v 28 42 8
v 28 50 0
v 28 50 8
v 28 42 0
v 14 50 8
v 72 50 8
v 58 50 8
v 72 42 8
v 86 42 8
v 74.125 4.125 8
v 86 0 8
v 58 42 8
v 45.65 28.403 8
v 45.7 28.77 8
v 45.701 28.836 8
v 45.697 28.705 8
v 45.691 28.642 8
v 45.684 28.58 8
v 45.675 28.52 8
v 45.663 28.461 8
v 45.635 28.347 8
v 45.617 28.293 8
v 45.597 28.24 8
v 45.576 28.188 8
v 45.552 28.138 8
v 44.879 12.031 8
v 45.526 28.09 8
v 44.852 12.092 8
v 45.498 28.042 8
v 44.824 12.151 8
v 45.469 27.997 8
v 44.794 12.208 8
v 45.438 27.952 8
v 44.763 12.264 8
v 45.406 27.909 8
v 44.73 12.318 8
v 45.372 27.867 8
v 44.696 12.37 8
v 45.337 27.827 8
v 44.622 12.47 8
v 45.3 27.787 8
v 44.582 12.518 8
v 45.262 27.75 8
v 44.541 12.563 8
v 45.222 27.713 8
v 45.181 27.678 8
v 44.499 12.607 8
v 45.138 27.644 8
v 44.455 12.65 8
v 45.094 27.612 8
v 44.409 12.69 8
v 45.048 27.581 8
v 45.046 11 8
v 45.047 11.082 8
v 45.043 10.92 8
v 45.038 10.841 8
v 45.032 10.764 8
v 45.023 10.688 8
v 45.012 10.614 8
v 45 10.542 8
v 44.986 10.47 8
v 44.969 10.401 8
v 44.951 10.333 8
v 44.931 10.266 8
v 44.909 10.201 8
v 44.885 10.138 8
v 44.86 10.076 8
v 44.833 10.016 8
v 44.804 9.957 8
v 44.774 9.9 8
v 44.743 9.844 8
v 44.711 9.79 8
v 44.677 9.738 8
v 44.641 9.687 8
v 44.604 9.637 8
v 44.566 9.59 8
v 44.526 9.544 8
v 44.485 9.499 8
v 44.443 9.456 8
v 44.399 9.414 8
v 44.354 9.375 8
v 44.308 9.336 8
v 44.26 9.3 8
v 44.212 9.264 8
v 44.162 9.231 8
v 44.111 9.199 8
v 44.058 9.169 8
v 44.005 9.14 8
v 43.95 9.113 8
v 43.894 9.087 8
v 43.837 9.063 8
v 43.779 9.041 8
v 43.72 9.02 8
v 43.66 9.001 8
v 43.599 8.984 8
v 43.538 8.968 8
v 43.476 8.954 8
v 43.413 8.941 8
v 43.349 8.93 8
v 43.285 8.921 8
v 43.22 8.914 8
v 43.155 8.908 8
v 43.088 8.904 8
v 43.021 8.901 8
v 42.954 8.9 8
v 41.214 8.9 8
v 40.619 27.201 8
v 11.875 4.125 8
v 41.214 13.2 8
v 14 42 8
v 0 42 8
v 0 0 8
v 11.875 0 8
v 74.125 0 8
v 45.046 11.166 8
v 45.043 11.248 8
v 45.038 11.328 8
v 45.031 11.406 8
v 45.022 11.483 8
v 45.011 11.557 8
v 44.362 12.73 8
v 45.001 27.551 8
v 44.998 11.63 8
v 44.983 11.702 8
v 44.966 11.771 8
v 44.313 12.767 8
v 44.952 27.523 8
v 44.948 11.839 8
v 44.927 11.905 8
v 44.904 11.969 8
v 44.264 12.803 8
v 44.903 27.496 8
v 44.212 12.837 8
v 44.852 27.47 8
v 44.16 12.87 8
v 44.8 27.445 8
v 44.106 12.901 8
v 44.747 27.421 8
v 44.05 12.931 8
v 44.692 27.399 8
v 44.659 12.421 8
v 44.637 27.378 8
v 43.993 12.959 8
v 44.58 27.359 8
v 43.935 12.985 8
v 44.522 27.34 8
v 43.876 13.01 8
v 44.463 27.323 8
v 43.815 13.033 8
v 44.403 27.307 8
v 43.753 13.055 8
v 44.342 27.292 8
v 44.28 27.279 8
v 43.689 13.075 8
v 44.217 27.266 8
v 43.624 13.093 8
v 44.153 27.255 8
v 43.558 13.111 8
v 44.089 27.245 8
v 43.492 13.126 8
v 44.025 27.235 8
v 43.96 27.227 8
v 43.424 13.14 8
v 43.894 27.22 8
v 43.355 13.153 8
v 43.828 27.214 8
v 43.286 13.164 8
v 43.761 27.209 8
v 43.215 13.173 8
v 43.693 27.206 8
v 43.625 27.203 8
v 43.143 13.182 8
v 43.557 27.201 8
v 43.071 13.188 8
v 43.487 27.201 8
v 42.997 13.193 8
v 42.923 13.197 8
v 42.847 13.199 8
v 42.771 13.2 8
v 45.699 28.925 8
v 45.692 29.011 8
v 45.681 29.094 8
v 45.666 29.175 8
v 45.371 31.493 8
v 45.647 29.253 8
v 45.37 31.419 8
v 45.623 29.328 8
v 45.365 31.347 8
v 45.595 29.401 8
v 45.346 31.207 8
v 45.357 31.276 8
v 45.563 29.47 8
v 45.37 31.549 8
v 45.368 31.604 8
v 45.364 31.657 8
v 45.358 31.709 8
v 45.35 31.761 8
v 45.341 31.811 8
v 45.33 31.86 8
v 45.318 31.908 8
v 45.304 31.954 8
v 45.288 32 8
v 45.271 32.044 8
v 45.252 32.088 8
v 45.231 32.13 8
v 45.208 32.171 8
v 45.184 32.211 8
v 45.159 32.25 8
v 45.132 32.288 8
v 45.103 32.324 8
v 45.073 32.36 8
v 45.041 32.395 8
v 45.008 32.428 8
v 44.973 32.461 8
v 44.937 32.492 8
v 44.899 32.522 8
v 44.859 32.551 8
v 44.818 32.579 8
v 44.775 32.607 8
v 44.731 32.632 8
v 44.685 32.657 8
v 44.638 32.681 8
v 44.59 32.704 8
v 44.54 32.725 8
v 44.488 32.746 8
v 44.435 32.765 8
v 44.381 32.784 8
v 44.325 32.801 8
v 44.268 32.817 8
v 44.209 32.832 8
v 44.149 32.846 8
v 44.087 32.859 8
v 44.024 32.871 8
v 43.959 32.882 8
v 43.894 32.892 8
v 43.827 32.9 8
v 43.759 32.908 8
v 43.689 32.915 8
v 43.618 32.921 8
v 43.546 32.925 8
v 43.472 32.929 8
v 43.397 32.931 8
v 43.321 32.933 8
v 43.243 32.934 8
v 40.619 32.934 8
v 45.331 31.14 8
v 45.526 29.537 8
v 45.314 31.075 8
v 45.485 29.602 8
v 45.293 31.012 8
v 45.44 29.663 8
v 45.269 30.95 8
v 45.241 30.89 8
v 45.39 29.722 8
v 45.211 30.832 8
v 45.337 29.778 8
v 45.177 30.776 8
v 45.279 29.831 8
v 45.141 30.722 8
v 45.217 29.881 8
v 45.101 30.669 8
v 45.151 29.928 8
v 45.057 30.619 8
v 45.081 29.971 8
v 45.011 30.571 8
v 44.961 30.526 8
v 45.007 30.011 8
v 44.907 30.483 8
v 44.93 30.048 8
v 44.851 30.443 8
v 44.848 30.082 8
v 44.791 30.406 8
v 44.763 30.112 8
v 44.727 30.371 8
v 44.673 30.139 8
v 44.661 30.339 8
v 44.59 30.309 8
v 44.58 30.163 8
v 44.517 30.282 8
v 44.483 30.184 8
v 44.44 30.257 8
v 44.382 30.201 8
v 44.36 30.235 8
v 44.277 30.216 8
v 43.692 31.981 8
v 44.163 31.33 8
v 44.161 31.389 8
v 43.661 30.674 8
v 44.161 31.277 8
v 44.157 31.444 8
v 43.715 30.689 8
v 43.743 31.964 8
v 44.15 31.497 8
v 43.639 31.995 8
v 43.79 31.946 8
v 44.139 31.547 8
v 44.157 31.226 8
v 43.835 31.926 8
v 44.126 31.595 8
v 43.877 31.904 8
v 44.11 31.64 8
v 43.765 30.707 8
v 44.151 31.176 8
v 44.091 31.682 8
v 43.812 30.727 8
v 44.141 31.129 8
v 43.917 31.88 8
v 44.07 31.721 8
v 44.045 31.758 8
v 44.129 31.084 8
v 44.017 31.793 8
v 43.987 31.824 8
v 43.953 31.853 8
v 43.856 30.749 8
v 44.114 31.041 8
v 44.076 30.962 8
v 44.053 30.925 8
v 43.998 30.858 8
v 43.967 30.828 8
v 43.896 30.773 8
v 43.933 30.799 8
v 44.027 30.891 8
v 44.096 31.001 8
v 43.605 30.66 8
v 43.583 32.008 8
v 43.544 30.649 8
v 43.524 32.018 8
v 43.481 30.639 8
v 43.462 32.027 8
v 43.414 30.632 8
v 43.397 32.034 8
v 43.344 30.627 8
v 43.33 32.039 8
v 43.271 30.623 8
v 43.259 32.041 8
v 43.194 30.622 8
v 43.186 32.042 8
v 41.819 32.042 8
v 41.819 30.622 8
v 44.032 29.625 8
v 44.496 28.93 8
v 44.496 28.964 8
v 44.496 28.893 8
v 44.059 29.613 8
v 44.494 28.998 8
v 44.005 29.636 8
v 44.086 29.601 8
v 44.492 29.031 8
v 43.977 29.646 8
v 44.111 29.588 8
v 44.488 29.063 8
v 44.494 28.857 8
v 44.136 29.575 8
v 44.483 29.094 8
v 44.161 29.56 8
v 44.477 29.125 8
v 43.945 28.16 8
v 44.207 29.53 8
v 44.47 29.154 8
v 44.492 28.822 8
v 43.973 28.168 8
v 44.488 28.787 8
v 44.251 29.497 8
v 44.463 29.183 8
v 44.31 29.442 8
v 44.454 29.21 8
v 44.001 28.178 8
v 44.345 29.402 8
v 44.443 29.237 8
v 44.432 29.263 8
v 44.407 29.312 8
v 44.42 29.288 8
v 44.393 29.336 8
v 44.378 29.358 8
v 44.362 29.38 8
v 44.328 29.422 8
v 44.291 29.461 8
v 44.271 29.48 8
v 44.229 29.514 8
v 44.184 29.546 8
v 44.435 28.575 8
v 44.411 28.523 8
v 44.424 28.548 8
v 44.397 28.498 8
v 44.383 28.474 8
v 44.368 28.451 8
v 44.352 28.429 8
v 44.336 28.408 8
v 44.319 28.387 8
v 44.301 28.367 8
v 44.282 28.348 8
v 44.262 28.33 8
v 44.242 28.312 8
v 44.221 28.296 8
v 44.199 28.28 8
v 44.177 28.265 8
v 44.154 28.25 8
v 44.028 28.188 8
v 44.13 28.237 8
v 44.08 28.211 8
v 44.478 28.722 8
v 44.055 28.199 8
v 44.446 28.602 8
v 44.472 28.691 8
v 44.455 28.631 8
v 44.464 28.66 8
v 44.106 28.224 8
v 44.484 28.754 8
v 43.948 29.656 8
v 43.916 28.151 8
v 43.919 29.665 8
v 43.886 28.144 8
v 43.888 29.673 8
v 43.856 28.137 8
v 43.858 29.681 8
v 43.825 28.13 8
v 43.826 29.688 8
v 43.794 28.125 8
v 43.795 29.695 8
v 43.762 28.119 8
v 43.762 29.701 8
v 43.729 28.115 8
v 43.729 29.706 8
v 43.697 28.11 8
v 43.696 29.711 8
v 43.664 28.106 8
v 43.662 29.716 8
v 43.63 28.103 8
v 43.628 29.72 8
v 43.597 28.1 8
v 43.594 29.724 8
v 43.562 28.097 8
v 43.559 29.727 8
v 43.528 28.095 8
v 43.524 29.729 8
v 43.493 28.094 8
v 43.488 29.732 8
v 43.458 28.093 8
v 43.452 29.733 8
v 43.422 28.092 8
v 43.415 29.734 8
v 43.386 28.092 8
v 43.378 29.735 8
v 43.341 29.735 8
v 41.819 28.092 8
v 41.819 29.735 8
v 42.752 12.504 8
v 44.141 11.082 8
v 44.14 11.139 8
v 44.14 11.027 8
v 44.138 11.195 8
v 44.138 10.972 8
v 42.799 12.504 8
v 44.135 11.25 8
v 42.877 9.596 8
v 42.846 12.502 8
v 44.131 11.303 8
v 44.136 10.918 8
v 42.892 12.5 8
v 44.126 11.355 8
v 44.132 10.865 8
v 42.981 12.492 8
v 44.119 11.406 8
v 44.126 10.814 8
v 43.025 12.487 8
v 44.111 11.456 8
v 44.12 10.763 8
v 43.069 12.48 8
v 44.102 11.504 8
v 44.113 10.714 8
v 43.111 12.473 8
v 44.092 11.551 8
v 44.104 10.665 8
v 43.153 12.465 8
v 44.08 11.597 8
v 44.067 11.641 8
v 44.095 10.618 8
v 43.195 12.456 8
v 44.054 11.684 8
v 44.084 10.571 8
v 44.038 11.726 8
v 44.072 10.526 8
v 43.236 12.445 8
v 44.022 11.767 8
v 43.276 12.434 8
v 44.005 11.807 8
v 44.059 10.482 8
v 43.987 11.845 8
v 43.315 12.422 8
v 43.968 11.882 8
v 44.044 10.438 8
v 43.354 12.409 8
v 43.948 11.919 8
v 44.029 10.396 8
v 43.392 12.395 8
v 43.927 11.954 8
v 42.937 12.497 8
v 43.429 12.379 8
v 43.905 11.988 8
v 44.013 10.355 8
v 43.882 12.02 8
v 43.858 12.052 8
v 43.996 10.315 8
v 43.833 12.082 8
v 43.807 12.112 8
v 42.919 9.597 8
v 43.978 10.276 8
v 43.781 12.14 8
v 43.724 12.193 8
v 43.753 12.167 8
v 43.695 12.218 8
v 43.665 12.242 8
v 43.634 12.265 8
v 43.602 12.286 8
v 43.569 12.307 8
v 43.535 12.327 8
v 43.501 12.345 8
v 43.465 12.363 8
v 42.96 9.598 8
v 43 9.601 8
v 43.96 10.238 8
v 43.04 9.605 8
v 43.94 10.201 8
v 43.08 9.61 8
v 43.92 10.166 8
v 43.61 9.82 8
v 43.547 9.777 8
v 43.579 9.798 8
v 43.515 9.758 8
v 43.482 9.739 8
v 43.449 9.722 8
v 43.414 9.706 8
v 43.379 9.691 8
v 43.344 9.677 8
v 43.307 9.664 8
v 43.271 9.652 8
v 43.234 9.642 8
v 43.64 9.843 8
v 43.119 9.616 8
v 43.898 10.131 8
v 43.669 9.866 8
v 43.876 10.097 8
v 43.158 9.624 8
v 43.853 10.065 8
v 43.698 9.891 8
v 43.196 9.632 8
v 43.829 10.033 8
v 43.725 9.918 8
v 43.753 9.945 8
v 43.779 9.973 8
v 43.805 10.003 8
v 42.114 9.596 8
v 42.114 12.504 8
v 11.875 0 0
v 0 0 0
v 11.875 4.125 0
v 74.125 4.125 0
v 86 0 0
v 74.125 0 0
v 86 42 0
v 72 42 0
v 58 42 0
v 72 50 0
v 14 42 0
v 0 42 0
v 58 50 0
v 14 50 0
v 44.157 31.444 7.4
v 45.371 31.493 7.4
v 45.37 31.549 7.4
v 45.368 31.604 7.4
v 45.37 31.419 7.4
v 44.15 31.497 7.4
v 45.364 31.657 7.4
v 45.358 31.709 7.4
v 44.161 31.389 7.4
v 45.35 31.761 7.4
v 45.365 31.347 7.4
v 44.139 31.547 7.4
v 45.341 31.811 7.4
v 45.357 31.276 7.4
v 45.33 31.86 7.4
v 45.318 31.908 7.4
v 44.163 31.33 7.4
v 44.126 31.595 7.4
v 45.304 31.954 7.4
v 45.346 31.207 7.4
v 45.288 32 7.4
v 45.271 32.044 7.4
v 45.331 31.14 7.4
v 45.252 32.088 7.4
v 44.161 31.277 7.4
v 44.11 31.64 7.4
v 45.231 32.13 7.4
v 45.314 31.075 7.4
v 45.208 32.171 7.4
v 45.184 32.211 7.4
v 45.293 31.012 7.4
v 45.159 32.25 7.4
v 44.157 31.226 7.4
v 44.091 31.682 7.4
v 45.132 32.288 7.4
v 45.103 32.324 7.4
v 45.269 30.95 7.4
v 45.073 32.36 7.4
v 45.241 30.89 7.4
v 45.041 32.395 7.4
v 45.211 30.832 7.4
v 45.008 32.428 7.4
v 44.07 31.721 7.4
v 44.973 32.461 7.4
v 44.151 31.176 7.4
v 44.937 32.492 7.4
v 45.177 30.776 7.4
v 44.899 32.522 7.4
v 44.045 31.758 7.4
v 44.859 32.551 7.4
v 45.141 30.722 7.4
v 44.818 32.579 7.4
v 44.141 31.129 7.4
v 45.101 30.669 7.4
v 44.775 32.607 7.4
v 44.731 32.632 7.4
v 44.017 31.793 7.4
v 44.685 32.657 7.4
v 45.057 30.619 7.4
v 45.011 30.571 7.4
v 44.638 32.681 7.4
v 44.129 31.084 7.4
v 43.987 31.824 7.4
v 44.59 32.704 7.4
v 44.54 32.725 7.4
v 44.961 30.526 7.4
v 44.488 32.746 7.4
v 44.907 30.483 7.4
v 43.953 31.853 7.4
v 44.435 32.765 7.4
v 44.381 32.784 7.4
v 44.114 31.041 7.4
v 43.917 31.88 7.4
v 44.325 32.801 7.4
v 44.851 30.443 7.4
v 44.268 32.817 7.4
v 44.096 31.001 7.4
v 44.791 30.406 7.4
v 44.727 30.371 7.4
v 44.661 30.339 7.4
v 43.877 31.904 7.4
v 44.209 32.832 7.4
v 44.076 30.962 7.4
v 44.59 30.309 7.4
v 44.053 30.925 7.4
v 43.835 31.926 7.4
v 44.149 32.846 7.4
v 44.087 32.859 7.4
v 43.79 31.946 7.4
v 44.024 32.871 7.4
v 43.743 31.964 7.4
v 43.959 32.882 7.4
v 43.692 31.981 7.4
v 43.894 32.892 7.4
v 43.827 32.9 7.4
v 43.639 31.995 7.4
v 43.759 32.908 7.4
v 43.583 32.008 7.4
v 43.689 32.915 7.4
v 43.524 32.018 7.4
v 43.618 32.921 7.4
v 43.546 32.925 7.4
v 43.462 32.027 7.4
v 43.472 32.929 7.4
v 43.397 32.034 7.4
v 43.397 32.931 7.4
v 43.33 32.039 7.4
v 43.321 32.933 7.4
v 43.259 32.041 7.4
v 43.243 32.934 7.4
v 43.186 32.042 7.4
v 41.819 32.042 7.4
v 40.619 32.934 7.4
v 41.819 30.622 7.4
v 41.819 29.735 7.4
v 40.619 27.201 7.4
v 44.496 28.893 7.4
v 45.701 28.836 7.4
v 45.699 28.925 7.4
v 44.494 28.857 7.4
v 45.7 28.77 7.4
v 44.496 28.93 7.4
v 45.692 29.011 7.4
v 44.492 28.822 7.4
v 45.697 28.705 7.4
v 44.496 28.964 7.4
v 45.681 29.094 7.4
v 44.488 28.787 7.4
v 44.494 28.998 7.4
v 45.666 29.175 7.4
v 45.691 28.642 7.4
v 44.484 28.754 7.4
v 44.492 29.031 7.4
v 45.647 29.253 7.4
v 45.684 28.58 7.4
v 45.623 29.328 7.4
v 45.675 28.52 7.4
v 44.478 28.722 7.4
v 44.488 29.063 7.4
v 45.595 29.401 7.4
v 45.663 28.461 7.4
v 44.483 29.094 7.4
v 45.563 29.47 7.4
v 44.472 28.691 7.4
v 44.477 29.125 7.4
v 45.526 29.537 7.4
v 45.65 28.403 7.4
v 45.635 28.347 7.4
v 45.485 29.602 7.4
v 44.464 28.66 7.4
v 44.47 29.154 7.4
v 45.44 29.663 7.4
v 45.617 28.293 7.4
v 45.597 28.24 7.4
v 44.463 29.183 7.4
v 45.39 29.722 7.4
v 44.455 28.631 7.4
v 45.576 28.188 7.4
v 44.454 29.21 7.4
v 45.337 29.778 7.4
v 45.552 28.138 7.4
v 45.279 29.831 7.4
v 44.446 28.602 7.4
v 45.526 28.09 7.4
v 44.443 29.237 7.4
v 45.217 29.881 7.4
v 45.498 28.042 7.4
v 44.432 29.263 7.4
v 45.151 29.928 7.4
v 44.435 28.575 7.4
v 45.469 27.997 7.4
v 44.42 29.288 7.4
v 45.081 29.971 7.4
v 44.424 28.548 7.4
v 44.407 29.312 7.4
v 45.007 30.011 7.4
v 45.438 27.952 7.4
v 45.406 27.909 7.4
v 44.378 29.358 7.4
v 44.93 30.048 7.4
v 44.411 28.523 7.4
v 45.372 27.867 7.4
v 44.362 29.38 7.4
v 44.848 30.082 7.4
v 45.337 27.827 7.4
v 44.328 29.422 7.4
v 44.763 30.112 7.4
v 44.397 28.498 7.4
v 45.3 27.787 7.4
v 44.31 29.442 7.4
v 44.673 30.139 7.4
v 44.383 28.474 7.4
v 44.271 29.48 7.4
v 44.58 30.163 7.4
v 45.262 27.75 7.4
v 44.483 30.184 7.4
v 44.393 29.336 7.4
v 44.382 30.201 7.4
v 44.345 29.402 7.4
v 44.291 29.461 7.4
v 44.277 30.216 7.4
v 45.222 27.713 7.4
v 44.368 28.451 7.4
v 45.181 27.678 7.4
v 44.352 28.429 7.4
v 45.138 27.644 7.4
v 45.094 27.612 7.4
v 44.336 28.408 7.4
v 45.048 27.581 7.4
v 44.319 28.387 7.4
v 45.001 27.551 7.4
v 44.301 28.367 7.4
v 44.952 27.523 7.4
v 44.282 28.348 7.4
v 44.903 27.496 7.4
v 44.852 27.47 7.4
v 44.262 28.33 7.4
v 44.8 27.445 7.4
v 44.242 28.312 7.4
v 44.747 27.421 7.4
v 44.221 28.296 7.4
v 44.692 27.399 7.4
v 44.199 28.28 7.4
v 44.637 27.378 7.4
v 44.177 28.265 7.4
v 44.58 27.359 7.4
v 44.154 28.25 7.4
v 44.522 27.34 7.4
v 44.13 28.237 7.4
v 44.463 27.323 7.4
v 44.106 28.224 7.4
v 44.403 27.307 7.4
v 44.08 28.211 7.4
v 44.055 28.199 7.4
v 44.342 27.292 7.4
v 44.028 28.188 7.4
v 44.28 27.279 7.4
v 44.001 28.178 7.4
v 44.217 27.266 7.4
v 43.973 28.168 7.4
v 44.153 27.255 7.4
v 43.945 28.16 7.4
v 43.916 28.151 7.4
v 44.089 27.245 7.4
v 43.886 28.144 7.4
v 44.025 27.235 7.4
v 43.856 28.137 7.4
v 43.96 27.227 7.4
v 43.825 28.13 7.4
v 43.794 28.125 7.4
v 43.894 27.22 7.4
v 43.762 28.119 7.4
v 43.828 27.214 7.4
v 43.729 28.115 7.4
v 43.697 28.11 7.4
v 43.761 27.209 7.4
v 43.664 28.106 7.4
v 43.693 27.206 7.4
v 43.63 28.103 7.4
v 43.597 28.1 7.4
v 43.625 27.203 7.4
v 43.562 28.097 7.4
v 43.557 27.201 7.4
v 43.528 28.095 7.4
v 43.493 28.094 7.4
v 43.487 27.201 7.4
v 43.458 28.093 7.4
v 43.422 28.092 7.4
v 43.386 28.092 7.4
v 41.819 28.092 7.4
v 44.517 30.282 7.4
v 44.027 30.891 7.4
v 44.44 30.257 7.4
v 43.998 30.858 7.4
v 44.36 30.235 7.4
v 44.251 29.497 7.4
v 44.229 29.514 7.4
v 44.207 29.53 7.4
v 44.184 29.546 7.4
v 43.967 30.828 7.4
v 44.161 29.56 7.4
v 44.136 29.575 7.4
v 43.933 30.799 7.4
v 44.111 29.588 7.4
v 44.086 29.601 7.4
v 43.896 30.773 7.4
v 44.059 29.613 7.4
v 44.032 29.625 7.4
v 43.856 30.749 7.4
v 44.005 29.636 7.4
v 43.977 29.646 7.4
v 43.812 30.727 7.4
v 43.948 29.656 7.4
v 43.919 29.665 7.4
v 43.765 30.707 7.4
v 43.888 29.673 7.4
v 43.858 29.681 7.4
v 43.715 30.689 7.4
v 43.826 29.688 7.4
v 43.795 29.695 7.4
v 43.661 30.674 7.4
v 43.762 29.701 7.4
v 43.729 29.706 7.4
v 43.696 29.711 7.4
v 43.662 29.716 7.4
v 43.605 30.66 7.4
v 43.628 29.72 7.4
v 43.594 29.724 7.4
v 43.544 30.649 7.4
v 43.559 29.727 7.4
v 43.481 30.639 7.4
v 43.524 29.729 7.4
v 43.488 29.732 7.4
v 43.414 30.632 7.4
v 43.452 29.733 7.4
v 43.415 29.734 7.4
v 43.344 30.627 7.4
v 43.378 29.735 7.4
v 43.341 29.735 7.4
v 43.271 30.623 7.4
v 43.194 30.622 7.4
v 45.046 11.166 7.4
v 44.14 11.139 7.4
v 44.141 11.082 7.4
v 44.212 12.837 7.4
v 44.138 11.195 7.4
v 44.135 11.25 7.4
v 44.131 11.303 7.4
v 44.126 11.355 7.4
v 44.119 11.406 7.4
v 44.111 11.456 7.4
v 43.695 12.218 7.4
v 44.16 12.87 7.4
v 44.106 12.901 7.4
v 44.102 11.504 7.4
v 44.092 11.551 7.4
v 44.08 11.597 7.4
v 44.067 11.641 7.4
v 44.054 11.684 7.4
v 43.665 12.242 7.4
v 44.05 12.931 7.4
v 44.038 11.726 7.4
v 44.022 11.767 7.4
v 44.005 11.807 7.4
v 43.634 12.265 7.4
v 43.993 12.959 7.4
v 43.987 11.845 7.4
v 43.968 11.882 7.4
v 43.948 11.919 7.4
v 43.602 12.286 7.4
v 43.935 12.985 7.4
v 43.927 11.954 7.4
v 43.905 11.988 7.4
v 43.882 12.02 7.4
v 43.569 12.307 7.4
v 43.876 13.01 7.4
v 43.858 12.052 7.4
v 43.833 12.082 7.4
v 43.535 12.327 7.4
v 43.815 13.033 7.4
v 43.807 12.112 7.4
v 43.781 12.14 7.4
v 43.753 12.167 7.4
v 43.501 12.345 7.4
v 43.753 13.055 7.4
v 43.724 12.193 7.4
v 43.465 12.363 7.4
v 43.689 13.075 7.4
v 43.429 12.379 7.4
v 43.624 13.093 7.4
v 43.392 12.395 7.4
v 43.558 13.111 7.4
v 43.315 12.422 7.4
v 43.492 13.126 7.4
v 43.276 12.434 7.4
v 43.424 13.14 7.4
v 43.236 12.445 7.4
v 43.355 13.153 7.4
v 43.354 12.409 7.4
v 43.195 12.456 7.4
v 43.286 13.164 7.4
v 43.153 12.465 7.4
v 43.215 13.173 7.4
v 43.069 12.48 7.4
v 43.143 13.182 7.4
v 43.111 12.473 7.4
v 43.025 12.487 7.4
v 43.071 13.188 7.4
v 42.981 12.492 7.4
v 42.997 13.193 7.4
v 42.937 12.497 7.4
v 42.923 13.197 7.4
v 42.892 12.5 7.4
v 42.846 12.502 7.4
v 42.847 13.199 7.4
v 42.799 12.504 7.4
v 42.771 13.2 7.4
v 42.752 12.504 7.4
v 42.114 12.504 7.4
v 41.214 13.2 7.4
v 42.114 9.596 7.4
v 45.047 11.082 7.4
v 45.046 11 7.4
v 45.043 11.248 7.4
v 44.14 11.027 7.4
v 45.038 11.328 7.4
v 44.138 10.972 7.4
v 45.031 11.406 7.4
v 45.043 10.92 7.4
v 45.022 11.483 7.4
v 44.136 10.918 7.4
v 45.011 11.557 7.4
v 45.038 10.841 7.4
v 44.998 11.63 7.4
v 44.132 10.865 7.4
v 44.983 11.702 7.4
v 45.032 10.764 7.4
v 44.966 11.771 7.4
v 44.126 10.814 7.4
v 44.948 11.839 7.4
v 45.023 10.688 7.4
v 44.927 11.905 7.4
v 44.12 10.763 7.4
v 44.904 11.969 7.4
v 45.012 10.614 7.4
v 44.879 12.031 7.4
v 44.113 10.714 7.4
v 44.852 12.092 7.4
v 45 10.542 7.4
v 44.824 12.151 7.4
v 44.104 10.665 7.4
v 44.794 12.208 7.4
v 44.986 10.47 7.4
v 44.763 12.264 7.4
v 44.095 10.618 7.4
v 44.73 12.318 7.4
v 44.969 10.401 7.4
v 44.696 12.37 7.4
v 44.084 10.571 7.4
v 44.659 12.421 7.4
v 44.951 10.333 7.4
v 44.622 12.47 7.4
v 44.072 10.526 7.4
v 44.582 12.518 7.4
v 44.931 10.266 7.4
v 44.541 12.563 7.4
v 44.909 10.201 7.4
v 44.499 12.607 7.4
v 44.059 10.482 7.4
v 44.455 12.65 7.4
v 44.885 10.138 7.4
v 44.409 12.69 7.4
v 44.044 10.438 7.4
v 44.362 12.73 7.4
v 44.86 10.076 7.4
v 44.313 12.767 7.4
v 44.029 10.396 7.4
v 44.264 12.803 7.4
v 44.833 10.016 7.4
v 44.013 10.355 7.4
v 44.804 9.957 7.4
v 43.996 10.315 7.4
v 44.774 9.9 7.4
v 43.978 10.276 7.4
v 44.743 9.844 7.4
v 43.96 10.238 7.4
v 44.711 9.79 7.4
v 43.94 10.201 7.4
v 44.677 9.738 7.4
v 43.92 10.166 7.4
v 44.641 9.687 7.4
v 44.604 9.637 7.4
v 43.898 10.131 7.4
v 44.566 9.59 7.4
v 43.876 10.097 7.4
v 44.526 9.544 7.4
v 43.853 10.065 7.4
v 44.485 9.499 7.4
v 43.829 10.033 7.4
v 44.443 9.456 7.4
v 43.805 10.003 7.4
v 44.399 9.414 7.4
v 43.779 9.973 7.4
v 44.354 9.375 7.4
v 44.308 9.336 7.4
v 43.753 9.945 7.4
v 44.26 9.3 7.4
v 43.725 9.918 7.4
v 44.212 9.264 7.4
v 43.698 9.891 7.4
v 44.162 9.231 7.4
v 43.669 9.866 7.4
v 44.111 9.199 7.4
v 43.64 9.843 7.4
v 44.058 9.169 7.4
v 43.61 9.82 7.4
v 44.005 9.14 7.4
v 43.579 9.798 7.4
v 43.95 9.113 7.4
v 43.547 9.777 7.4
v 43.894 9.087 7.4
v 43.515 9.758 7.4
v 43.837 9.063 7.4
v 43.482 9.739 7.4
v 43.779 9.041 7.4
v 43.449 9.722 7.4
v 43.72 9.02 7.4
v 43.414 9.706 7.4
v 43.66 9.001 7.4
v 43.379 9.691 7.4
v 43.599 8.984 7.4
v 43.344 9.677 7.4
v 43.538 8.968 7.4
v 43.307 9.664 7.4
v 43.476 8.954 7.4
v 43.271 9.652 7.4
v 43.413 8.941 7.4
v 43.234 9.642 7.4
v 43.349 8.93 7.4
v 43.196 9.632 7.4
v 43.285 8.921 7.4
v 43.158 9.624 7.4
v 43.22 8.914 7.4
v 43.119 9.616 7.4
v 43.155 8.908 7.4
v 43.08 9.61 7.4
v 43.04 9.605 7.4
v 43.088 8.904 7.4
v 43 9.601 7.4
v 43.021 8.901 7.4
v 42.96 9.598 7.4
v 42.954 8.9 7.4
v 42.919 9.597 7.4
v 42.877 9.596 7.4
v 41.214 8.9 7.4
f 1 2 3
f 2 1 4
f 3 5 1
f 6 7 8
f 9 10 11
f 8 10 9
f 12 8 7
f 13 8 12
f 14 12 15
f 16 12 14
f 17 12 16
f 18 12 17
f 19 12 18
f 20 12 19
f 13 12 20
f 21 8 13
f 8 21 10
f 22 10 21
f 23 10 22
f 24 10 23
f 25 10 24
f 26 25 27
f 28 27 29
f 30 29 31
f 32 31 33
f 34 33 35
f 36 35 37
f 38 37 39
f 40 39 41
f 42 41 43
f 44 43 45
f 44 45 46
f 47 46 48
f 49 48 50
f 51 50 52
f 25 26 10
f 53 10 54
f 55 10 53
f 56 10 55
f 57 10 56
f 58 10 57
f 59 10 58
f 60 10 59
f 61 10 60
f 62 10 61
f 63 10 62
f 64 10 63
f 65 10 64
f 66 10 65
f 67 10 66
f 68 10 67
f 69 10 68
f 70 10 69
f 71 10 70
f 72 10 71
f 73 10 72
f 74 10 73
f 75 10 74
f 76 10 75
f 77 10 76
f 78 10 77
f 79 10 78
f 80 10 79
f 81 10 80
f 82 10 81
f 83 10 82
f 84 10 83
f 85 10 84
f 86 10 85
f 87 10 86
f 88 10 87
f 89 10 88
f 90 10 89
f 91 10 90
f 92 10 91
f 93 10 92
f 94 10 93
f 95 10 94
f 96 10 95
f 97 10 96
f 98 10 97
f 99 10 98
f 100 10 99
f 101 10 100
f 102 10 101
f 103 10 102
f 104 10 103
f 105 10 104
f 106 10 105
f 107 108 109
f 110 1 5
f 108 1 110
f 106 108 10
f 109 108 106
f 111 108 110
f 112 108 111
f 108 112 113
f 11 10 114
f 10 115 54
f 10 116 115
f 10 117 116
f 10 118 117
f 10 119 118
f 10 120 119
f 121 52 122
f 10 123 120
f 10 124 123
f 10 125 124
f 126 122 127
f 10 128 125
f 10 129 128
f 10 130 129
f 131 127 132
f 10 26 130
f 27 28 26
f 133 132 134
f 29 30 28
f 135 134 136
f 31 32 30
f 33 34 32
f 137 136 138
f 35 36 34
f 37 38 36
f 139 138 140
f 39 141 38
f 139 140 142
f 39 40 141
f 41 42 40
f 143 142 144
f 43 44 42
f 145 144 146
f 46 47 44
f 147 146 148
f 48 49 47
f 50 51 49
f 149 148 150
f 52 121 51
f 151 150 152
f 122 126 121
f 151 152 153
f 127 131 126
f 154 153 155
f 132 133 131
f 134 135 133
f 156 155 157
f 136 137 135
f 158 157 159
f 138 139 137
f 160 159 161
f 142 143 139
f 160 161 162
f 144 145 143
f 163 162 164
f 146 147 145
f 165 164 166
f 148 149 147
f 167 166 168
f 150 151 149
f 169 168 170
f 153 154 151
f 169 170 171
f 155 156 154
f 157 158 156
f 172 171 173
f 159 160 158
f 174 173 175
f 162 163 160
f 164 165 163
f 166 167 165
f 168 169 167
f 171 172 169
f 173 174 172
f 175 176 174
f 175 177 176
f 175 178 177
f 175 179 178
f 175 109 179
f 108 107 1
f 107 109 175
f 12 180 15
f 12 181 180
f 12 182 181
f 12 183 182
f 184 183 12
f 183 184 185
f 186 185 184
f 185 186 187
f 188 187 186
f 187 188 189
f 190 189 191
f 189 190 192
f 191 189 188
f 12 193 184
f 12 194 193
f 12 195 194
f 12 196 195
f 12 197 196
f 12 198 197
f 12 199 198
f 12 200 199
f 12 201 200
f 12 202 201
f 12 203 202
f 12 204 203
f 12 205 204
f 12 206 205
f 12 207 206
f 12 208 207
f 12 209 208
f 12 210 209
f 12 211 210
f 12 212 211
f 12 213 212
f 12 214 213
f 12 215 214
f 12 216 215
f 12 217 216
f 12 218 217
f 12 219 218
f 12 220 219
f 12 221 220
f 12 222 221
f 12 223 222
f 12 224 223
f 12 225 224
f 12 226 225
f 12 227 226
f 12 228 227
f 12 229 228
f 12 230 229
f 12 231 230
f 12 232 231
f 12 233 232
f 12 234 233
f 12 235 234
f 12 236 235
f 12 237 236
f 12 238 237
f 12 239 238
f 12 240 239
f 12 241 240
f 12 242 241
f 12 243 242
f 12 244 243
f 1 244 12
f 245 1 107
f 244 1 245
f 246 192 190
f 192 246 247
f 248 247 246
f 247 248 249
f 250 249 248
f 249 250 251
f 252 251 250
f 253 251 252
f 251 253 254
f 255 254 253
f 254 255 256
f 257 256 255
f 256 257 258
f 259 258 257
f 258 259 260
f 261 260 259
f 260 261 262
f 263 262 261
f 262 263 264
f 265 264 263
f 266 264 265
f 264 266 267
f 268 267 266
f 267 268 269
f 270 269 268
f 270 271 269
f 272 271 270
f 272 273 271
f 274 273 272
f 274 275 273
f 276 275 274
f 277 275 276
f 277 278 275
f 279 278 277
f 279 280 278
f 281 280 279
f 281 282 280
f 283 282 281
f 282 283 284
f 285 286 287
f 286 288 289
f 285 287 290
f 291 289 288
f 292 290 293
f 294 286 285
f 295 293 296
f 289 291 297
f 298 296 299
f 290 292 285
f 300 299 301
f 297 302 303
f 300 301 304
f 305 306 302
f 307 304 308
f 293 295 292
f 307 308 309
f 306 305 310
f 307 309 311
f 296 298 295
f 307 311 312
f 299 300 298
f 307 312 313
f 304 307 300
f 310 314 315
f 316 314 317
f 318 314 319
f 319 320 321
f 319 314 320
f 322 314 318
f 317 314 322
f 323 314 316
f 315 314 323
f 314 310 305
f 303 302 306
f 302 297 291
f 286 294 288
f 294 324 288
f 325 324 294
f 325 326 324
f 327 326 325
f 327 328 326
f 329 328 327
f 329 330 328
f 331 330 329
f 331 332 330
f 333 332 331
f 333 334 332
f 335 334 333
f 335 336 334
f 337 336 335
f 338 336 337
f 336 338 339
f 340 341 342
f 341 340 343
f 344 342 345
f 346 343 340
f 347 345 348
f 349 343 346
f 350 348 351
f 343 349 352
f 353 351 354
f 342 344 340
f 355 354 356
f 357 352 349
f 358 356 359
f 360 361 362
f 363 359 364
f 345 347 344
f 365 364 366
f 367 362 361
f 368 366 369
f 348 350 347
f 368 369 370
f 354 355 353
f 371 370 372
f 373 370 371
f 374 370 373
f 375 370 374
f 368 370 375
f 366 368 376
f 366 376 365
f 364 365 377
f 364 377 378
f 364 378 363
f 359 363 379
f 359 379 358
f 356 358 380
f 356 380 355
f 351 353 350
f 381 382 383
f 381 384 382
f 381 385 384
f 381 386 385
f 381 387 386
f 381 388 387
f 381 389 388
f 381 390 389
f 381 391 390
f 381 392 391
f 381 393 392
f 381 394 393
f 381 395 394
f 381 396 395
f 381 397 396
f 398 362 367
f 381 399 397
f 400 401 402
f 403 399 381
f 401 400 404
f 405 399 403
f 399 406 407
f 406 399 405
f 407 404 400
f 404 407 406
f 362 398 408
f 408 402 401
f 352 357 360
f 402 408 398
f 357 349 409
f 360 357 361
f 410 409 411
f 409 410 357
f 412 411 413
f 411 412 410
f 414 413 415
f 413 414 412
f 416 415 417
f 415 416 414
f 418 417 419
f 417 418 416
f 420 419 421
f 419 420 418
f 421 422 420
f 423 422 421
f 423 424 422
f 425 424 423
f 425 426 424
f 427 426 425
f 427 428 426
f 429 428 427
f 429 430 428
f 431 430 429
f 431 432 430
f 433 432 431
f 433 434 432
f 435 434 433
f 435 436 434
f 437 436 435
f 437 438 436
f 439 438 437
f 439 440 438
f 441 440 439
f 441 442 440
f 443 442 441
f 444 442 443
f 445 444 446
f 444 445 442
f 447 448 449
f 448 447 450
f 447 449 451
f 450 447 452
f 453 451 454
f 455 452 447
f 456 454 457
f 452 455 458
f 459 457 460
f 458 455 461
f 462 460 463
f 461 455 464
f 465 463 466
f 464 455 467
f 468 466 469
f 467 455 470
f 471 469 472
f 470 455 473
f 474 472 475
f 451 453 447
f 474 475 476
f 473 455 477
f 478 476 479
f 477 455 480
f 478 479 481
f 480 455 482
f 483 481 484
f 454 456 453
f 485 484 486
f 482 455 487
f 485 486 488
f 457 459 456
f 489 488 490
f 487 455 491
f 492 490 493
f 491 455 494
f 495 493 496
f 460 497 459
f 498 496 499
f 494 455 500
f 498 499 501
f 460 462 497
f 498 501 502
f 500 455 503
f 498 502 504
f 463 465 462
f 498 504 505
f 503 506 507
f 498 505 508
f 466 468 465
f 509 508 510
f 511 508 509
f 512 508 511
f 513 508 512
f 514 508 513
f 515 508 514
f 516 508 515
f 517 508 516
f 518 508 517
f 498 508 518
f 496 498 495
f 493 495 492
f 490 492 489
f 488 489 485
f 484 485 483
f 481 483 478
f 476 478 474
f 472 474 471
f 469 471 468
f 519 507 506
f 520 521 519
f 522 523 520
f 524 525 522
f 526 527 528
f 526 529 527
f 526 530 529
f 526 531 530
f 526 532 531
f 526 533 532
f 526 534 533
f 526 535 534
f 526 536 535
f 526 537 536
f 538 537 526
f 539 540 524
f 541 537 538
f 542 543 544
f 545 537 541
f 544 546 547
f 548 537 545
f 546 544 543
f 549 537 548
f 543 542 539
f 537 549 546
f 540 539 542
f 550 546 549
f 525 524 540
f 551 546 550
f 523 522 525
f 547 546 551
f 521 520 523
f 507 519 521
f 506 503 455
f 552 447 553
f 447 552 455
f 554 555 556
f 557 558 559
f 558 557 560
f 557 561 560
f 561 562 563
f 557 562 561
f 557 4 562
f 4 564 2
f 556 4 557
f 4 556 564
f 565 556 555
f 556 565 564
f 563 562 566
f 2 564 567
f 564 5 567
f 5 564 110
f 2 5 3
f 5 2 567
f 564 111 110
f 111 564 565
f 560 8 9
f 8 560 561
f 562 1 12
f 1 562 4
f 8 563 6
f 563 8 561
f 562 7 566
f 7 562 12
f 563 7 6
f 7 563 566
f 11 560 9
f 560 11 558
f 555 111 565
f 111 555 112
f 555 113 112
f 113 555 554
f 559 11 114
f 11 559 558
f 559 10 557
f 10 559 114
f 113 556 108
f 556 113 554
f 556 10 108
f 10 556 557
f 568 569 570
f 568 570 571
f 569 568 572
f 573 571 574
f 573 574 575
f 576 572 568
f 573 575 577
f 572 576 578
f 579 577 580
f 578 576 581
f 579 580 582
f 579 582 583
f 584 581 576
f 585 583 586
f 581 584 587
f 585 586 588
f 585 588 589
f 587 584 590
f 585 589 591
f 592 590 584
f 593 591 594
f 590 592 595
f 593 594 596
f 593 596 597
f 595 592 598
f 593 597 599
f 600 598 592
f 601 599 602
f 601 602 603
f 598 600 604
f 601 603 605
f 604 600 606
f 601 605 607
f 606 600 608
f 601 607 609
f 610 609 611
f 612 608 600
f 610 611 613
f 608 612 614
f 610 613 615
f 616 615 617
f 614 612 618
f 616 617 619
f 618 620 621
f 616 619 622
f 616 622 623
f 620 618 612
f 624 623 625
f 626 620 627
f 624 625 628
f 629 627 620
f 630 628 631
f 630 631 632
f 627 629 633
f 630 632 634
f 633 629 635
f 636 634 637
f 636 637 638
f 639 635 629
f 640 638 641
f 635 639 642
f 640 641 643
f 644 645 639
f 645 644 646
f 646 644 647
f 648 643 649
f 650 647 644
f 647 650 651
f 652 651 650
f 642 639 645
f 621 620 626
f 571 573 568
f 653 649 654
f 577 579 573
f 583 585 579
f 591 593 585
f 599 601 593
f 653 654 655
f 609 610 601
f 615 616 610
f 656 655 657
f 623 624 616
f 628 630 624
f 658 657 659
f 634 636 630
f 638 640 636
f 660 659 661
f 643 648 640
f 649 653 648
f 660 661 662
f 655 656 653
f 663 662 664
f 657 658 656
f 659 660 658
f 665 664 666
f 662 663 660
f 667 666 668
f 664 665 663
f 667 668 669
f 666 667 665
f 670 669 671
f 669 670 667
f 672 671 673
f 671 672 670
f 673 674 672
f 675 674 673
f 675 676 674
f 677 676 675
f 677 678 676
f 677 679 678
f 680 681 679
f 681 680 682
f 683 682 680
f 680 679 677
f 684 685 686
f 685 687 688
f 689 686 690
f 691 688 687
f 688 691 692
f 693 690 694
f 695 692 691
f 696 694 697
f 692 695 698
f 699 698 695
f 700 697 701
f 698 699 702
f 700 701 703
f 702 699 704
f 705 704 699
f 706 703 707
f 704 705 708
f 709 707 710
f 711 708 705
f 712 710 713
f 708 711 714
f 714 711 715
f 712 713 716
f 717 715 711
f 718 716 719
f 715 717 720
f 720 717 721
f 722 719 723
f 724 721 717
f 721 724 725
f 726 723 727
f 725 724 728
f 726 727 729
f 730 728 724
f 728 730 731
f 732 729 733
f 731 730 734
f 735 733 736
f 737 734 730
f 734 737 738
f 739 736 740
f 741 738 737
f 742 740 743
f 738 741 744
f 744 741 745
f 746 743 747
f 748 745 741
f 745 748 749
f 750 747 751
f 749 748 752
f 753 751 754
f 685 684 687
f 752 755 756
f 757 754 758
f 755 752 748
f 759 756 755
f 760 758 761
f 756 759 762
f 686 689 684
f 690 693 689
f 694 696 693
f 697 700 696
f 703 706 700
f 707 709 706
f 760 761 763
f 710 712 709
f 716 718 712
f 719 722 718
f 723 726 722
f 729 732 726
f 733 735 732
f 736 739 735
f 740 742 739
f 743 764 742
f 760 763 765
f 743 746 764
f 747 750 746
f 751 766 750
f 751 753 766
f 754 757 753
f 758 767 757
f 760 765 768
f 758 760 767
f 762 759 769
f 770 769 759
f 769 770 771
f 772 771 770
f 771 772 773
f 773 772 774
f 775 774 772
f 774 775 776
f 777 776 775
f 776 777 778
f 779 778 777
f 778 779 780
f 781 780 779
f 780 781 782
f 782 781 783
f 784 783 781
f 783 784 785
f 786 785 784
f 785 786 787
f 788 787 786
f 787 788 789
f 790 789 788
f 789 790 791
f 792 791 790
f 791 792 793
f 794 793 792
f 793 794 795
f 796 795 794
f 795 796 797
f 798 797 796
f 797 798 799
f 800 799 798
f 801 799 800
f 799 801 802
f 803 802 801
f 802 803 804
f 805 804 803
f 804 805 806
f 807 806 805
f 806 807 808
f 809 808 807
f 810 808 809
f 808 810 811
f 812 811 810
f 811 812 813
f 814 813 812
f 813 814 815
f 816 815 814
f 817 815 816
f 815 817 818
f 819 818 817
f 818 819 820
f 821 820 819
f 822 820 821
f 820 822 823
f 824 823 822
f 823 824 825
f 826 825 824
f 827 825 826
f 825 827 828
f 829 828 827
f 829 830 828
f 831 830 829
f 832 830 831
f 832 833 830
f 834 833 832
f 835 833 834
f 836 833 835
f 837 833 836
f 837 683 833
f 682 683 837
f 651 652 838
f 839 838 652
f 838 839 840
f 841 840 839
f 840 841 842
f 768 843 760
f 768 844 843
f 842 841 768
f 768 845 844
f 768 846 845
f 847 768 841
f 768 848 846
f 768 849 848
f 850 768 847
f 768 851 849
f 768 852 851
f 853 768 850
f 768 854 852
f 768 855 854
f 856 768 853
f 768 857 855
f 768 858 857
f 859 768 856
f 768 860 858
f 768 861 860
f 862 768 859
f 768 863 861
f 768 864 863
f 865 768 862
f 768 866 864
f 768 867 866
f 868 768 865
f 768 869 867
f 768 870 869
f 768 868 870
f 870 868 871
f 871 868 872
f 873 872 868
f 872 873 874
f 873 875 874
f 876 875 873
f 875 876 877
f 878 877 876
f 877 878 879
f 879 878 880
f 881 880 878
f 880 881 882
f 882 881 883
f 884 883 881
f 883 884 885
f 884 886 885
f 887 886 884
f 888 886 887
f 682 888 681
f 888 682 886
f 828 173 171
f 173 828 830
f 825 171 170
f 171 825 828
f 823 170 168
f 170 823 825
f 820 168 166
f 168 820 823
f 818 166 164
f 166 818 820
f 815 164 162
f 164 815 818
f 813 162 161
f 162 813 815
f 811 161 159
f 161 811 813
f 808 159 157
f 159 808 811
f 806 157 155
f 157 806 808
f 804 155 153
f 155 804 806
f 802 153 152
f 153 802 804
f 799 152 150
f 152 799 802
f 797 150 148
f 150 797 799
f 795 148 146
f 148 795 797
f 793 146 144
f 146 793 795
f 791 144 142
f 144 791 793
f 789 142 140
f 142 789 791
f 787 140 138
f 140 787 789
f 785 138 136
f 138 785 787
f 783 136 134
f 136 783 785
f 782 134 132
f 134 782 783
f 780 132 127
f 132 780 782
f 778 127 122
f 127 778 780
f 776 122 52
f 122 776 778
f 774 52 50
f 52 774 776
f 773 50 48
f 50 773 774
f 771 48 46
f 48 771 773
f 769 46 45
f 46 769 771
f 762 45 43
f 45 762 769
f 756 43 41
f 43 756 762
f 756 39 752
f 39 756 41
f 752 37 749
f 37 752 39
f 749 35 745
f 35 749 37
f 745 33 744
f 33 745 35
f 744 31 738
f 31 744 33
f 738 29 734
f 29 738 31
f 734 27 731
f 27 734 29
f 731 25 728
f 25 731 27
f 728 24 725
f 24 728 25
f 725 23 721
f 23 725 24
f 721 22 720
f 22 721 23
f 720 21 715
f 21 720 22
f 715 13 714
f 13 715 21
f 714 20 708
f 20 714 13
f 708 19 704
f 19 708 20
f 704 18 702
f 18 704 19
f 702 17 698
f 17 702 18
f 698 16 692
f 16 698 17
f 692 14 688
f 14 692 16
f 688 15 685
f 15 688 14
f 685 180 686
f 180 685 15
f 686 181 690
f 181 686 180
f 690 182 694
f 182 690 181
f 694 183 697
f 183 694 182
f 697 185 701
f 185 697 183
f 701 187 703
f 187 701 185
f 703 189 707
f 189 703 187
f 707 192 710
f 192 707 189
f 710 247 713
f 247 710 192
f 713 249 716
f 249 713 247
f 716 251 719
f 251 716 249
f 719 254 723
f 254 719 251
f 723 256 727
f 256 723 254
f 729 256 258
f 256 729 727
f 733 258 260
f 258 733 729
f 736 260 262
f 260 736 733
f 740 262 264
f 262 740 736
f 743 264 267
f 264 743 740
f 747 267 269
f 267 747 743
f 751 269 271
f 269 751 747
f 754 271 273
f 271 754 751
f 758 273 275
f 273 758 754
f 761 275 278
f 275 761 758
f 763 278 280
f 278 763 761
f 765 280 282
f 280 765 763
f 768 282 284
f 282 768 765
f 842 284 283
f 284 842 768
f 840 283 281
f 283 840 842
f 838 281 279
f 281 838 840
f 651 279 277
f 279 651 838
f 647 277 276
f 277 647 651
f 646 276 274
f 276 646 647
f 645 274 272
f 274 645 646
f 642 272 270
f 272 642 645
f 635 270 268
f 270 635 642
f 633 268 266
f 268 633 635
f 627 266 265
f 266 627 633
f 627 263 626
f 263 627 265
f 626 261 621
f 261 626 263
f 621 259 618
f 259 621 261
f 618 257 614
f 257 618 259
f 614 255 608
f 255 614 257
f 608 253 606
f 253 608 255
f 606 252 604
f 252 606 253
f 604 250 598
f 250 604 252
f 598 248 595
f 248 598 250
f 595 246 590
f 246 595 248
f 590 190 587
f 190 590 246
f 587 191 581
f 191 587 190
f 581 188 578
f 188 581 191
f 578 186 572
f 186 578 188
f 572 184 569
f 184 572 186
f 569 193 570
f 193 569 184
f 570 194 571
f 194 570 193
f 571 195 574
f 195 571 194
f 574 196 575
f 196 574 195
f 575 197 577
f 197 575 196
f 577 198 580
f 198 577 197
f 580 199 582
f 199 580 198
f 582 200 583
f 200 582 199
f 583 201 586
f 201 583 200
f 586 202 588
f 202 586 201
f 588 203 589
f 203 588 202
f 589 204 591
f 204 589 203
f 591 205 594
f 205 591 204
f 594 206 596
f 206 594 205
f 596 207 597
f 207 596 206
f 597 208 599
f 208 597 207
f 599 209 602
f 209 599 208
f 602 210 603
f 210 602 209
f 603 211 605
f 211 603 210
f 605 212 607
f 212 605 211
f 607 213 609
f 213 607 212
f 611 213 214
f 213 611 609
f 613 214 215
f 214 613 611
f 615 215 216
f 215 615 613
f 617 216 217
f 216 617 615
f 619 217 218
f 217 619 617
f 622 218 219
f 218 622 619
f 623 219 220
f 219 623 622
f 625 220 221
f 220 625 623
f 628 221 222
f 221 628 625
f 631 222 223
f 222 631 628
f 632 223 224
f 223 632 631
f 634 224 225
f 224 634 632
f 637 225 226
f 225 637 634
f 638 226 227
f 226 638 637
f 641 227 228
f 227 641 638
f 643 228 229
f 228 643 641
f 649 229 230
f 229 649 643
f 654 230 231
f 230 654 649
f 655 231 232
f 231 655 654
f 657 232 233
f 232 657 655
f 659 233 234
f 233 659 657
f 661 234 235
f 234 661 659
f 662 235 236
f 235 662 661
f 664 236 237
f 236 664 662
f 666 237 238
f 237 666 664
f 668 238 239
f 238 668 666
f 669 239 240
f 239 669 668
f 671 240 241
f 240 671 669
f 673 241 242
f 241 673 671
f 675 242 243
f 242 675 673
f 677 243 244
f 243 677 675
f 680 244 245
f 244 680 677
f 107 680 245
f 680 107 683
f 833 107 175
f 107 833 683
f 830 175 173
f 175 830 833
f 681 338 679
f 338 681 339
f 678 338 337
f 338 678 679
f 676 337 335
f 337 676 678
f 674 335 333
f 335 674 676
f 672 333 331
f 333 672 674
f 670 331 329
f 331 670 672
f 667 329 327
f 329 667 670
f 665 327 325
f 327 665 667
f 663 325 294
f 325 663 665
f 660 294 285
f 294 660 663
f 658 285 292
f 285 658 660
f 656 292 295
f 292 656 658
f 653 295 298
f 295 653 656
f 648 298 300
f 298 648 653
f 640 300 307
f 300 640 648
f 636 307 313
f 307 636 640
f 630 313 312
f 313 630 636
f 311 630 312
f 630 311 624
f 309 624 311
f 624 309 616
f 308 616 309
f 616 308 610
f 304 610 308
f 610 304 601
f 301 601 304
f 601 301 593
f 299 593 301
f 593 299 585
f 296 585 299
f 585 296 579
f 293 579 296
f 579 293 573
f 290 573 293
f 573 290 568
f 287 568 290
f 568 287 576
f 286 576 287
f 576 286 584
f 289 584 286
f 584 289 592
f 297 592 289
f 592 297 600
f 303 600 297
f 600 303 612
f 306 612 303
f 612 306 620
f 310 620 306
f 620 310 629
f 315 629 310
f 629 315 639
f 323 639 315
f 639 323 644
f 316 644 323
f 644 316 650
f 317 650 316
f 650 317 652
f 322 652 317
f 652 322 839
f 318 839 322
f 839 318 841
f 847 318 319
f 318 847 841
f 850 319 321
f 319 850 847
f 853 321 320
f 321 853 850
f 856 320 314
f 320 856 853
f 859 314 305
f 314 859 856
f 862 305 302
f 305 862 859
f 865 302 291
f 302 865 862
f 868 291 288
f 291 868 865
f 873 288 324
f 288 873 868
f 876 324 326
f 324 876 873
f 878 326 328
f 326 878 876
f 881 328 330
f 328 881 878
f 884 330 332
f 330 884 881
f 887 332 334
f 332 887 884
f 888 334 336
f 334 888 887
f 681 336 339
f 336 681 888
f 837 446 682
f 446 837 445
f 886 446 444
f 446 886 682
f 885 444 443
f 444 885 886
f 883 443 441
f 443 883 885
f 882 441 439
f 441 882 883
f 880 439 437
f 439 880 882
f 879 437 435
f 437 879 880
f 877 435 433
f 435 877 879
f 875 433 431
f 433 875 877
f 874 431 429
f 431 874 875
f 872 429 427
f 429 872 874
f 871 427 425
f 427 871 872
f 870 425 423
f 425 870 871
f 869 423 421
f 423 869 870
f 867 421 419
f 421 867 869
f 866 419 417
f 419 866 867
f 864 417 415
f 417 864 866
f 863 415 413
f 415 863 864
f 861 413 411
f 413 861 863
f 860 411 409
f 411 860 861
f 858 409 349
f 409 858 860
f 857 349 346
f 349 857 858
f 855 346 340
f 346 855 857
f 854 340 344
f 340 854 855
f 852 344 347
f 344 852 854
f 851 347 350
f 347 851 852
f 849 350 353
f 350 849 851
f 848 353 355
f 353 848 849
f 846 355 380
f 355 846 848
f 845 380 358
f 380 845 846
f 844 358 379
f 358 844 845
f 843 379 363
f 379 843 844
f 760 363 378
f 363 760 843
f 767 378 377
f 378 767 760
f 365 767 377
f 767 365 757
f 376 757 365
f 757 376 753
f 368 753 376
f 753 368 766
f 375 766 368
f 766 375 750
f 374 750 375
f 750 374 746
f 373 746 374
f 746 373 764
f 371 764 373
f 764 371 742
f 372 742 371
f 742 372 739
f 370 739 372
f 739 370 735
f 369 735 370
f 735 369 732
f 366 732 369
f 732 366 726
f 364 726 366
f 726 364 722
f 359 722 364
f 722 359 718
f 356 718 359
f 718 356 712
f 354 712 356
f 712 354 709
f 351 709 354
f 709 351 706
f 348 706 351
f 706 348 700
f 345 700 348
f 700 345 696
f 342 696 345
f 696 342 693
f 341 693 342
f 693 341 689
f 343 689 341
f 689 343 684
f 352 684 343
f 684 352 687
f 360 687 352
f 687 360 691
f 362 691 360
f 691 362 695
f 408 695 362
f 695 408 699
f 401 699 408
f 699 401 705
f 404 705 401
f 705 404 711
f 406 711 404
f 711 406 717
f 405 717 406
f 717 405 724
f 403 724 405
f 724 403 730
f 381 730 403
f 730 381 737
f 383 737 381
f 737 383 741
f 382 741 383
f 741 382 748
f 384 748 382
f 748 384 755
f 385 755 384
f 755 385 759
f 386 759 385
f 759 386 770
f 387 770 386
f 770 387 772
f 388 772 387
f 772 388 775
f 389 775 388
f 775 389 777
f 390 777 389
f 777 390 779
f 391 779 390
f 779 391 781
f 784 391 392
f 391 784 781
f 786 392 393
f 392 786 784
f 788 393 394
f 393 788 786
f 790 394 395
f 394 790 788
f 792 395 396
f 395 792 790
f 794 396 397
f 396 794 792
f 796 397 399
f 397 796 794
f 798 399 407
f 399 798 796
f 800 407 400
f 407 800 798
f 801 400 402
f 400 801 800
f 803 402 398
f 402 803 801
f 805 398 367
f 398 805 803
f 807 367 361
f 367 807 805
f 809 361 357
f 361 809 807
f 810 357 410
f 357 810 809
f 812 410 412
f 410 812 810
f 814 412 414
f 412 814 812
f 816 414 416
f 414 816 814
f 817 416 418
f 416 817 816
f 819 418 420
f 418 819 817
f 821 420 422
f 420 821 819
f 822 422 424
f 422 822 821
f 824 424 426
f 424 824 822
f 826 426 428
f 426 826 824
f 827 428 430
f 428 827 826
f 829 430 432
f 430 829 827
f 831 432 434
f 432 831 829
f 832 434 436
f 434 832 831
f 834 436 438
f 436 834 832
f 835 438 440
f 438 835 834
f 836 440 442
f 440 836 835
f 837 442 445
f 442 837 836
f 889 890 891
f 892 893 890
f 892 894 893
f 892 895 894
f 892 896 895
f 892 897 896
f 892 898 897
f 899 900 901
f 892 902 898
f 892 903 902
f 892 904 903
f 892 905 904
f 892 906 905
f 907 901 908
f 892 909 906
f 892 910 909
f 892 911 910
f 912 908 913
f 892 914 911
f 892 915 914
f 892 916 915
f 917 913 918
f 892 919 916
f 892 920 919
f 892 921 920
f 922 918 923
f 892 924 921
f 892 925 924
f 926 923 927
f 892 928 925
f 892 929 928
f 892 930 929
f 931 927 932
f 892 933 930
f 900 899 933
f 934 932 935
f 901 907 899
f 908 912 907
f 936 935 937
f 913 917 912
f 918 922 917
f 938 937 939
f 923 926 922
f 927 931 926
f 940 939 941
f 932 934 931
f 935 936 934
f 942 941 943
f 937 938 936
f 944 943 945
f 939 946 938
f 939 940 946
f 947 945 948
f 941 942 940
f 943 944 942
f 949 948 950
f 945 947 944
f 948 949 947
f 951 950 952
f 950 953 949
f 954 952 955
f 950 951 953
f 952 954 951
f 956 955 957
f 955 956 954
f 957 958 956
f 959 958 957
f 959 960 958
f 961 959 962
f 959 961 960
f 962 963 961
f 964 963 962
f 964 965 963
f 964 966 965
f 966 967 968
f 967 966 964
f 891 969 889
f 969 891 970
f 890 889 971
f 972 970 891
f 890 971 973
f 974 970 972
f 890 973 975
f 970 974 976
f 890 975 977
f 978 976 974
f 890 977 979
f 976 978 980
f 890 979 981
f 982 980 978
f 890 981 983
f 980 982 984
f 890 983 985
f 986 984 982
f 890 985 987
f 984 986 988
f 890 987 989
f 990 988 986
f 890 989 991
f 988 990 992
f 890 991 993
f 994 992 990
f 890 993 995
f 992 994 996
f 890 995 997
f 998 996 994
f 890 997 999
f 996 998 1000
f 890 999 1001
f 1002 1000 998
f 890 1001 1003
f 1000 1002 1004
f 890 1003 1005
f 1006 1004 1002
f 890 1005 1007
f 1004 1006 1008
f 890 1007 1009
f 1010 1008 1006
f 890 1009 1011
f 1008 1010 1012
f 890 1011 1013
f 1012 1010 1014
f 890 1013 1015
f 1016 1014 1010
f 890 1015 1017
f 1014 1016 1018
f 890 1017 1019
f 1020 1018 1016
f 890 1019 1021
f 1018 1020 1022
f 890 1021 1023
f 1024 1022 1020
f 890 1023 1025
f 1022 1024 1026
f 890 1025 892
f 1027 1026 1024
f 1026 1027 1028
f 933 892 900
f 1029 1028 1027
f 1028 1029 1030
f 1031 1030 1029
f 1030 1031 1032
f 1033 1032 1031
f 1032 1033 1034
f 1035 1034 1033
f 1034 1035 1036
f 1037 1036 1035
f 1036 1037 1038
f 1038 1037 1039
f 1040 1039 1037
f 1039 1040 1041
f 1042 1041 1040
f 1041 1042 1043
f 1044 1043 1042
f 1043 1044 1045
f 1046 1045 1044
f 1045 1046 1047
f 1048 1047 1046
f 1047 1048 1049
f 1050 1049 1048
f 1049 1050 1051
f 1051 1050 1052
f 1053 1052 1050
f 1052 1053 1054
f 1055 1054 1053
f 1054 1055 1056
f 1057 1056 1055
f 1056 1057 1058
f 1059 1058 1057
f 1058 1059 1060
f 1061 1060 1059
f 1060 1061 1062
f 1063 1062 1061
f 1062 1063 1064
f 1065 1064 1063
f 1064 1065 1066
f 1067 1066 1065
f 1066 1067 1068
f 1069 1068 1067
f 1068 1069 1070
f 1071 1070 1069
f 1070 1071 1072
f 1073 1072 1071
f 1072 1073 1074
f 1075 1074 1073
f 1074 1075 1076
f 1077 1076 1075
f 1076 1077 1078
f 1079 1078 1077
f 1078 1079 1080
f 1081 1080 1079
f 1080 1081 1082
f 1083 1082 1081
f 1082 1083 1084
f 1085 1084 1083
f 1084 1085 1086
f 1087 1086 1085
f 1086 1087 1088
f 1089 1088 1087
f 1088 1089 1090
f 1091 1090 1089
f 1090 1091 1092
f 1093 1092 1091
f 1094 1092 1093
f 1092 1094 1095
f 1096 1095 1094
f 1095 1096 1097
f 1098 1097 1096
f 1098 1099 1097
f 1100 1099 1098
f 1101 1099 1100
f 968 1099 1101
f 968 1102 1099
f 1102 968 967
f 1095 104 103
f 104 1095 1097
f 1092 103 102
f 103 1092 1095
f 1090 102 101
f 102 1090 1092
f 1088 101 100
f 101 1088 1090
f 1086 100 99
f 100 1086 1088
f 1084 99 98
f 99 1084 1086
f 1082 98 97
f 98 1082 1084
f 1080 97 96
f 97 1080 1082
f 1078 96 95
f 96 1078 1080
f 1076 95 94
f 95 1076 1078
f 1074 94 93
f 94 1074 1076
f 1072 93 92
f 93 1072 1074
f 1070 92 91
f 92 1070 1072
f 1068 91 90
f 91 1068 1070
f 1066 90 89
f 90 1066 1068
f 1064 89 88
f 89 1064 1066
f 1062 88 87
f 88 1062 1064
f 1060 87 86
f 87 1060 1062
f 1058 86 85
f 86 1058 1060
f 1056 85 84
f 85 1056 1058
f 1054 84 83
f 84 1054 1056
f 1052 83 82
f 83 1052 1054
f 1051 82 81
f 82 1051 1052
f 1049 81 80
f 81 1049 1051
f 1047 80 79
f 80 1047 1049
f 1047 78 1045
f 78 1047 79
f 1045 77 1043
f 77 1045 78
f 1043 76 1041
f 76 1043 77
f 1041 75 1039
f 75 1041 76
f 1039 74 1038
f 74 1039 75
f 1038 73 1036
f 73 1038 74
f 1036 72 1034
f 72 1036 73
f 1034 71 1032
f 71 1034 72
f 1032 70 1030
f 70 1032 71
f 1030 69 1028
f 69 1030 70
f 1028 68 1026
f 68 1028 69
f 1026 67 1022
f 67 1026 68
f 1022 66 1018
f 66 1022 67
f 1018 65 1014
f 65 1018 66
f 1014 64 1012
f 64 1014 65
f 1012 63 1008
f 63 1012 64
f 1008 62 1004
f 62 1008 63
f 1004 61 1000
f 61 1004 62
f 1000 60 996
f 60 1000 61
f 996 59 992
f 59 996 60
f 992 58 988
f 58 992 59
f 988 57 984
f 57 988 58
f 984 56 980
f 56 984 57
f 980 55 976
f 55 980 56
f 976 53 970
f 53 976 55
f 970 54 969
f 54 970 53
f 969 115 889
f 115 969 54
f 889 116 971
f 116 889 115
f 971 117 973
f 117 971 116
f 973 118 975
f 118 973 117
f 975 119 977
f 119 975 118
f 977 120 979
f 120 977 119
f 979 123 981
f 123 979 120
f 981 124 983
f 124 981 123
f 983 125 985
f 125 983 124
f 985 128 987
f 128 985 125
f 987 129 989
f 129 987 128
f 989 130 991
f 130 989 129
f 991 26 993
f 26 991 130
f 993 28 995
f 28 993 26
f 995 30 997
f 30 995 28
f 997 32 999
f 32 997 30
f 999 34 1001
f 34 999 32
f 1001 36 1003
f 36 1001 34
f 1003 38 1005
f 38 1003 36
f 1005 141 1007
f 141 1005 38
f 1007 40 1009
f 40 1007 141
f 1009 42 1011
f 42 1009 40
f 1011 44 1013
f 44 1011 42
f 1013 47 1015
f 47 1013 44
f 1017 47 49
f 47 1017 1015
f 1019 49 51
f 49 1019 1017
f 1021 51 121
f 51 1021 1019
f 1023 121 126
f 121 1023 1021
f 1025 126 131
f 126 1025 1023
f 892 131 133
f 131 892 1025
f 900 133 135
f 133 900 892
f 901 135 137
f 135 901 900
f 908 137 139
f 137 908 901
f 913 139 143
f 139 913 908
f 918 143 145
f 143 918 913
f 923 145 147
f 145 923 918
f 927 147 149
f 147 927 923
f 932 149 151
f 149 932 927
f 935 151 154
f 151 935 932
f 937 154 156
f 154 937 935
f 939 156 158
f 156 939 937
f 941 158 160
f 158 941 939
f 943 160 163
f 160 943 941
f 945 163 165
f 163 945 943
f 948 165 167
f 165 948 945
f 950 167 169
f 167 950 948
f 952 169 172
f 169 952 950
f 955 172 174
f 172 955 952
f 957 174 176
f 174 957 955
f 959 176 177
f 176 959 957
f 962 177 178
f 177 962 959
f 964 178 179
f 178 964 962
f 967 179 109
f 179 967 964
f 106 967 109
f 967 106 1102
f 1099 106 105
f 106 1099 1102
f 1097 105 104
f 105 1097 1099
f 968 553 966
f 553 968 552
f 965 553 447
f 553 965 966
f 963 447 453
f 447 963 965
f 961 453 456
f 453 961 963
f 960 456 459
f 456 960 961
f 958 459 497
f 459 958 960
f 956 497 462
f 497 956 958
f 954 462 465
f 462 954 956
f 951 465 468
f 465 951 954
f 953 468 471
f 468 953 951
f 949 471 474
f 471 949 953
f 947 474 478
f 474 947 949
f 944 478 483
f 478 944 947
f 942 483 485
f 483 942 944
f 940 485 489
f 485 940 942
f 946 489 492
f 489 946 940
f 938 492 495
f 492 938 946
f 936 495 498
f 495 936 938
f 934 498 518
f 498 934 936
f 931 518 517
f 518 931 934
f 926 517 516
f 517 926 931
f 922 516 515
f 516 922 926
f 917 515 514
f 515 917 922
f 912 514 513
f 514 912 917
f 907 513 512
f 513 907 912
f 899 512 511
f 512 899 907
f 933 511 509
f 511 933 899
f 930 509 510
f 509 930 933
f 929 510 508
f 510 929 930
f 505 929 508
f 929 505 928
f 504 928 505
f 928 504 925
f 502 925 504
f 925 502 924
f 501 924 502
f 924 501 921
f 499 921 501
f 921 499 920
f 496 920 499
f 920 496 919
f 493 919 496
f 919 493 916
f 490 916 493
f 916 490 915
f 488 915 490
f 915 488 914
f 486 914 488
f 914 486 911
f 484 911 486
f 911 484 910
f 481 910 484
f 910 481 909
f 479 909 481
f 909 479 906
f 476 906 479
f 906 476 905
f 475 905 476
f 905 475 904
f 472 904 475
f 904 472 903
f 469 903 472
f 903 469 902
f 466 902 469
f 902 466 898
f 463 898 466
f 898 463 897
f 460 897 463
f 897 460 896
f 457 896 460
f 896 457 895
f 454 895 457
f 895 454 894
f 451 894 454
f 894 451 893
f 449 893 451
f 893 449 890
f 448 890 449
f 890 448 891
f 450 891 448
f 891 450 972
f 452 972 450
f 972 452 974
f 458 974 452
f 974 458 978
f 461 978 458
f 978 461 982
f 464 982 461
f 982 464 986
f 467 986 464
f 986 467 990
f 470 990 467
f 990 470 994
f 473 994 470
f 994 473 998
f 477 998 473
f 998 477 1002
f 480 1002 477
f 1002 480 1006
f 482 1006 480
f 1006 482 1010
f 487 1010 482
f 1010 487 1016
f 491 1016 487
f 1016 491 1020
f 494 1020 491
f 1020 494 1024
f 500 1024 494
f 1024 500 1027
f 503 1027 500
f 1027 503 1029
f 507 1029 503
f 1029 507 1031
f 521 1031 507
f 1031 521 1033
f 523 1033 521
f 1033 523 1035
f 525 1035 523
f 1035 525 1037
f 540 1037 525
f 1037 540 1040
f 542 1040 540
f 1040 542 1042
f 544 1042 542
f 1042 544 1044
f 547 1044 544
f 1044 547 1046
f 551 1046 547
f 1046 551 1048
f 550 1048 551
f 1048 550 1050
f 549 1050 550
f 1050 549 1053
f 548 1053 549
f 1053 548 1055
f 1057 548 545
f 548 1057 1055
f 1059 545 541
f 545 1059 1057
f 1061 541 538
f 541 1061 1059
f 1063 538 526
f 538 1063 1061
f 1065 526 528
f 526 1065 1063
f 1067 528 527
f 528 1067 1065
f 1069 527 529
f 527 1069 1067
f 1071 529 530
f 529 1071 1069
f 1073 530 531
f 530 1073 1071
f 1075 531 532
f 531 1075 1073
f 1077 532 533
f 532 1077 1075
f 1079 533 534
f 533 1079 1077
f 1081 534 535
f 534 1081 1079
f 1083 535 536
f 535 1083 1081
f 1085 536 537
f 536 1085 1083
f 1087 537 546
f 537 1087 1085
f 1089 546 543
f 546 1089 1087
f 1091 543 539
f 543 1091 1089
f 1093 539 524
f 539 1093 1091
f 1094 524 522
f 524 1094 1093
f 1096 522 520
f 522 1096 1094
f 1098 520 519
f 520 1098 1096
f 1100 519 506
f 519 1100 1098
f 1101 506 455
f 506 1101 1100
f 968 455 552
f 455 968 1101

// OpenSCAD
use <../../../tec_cold_block_mockup.scad>

support_display_base_export();
